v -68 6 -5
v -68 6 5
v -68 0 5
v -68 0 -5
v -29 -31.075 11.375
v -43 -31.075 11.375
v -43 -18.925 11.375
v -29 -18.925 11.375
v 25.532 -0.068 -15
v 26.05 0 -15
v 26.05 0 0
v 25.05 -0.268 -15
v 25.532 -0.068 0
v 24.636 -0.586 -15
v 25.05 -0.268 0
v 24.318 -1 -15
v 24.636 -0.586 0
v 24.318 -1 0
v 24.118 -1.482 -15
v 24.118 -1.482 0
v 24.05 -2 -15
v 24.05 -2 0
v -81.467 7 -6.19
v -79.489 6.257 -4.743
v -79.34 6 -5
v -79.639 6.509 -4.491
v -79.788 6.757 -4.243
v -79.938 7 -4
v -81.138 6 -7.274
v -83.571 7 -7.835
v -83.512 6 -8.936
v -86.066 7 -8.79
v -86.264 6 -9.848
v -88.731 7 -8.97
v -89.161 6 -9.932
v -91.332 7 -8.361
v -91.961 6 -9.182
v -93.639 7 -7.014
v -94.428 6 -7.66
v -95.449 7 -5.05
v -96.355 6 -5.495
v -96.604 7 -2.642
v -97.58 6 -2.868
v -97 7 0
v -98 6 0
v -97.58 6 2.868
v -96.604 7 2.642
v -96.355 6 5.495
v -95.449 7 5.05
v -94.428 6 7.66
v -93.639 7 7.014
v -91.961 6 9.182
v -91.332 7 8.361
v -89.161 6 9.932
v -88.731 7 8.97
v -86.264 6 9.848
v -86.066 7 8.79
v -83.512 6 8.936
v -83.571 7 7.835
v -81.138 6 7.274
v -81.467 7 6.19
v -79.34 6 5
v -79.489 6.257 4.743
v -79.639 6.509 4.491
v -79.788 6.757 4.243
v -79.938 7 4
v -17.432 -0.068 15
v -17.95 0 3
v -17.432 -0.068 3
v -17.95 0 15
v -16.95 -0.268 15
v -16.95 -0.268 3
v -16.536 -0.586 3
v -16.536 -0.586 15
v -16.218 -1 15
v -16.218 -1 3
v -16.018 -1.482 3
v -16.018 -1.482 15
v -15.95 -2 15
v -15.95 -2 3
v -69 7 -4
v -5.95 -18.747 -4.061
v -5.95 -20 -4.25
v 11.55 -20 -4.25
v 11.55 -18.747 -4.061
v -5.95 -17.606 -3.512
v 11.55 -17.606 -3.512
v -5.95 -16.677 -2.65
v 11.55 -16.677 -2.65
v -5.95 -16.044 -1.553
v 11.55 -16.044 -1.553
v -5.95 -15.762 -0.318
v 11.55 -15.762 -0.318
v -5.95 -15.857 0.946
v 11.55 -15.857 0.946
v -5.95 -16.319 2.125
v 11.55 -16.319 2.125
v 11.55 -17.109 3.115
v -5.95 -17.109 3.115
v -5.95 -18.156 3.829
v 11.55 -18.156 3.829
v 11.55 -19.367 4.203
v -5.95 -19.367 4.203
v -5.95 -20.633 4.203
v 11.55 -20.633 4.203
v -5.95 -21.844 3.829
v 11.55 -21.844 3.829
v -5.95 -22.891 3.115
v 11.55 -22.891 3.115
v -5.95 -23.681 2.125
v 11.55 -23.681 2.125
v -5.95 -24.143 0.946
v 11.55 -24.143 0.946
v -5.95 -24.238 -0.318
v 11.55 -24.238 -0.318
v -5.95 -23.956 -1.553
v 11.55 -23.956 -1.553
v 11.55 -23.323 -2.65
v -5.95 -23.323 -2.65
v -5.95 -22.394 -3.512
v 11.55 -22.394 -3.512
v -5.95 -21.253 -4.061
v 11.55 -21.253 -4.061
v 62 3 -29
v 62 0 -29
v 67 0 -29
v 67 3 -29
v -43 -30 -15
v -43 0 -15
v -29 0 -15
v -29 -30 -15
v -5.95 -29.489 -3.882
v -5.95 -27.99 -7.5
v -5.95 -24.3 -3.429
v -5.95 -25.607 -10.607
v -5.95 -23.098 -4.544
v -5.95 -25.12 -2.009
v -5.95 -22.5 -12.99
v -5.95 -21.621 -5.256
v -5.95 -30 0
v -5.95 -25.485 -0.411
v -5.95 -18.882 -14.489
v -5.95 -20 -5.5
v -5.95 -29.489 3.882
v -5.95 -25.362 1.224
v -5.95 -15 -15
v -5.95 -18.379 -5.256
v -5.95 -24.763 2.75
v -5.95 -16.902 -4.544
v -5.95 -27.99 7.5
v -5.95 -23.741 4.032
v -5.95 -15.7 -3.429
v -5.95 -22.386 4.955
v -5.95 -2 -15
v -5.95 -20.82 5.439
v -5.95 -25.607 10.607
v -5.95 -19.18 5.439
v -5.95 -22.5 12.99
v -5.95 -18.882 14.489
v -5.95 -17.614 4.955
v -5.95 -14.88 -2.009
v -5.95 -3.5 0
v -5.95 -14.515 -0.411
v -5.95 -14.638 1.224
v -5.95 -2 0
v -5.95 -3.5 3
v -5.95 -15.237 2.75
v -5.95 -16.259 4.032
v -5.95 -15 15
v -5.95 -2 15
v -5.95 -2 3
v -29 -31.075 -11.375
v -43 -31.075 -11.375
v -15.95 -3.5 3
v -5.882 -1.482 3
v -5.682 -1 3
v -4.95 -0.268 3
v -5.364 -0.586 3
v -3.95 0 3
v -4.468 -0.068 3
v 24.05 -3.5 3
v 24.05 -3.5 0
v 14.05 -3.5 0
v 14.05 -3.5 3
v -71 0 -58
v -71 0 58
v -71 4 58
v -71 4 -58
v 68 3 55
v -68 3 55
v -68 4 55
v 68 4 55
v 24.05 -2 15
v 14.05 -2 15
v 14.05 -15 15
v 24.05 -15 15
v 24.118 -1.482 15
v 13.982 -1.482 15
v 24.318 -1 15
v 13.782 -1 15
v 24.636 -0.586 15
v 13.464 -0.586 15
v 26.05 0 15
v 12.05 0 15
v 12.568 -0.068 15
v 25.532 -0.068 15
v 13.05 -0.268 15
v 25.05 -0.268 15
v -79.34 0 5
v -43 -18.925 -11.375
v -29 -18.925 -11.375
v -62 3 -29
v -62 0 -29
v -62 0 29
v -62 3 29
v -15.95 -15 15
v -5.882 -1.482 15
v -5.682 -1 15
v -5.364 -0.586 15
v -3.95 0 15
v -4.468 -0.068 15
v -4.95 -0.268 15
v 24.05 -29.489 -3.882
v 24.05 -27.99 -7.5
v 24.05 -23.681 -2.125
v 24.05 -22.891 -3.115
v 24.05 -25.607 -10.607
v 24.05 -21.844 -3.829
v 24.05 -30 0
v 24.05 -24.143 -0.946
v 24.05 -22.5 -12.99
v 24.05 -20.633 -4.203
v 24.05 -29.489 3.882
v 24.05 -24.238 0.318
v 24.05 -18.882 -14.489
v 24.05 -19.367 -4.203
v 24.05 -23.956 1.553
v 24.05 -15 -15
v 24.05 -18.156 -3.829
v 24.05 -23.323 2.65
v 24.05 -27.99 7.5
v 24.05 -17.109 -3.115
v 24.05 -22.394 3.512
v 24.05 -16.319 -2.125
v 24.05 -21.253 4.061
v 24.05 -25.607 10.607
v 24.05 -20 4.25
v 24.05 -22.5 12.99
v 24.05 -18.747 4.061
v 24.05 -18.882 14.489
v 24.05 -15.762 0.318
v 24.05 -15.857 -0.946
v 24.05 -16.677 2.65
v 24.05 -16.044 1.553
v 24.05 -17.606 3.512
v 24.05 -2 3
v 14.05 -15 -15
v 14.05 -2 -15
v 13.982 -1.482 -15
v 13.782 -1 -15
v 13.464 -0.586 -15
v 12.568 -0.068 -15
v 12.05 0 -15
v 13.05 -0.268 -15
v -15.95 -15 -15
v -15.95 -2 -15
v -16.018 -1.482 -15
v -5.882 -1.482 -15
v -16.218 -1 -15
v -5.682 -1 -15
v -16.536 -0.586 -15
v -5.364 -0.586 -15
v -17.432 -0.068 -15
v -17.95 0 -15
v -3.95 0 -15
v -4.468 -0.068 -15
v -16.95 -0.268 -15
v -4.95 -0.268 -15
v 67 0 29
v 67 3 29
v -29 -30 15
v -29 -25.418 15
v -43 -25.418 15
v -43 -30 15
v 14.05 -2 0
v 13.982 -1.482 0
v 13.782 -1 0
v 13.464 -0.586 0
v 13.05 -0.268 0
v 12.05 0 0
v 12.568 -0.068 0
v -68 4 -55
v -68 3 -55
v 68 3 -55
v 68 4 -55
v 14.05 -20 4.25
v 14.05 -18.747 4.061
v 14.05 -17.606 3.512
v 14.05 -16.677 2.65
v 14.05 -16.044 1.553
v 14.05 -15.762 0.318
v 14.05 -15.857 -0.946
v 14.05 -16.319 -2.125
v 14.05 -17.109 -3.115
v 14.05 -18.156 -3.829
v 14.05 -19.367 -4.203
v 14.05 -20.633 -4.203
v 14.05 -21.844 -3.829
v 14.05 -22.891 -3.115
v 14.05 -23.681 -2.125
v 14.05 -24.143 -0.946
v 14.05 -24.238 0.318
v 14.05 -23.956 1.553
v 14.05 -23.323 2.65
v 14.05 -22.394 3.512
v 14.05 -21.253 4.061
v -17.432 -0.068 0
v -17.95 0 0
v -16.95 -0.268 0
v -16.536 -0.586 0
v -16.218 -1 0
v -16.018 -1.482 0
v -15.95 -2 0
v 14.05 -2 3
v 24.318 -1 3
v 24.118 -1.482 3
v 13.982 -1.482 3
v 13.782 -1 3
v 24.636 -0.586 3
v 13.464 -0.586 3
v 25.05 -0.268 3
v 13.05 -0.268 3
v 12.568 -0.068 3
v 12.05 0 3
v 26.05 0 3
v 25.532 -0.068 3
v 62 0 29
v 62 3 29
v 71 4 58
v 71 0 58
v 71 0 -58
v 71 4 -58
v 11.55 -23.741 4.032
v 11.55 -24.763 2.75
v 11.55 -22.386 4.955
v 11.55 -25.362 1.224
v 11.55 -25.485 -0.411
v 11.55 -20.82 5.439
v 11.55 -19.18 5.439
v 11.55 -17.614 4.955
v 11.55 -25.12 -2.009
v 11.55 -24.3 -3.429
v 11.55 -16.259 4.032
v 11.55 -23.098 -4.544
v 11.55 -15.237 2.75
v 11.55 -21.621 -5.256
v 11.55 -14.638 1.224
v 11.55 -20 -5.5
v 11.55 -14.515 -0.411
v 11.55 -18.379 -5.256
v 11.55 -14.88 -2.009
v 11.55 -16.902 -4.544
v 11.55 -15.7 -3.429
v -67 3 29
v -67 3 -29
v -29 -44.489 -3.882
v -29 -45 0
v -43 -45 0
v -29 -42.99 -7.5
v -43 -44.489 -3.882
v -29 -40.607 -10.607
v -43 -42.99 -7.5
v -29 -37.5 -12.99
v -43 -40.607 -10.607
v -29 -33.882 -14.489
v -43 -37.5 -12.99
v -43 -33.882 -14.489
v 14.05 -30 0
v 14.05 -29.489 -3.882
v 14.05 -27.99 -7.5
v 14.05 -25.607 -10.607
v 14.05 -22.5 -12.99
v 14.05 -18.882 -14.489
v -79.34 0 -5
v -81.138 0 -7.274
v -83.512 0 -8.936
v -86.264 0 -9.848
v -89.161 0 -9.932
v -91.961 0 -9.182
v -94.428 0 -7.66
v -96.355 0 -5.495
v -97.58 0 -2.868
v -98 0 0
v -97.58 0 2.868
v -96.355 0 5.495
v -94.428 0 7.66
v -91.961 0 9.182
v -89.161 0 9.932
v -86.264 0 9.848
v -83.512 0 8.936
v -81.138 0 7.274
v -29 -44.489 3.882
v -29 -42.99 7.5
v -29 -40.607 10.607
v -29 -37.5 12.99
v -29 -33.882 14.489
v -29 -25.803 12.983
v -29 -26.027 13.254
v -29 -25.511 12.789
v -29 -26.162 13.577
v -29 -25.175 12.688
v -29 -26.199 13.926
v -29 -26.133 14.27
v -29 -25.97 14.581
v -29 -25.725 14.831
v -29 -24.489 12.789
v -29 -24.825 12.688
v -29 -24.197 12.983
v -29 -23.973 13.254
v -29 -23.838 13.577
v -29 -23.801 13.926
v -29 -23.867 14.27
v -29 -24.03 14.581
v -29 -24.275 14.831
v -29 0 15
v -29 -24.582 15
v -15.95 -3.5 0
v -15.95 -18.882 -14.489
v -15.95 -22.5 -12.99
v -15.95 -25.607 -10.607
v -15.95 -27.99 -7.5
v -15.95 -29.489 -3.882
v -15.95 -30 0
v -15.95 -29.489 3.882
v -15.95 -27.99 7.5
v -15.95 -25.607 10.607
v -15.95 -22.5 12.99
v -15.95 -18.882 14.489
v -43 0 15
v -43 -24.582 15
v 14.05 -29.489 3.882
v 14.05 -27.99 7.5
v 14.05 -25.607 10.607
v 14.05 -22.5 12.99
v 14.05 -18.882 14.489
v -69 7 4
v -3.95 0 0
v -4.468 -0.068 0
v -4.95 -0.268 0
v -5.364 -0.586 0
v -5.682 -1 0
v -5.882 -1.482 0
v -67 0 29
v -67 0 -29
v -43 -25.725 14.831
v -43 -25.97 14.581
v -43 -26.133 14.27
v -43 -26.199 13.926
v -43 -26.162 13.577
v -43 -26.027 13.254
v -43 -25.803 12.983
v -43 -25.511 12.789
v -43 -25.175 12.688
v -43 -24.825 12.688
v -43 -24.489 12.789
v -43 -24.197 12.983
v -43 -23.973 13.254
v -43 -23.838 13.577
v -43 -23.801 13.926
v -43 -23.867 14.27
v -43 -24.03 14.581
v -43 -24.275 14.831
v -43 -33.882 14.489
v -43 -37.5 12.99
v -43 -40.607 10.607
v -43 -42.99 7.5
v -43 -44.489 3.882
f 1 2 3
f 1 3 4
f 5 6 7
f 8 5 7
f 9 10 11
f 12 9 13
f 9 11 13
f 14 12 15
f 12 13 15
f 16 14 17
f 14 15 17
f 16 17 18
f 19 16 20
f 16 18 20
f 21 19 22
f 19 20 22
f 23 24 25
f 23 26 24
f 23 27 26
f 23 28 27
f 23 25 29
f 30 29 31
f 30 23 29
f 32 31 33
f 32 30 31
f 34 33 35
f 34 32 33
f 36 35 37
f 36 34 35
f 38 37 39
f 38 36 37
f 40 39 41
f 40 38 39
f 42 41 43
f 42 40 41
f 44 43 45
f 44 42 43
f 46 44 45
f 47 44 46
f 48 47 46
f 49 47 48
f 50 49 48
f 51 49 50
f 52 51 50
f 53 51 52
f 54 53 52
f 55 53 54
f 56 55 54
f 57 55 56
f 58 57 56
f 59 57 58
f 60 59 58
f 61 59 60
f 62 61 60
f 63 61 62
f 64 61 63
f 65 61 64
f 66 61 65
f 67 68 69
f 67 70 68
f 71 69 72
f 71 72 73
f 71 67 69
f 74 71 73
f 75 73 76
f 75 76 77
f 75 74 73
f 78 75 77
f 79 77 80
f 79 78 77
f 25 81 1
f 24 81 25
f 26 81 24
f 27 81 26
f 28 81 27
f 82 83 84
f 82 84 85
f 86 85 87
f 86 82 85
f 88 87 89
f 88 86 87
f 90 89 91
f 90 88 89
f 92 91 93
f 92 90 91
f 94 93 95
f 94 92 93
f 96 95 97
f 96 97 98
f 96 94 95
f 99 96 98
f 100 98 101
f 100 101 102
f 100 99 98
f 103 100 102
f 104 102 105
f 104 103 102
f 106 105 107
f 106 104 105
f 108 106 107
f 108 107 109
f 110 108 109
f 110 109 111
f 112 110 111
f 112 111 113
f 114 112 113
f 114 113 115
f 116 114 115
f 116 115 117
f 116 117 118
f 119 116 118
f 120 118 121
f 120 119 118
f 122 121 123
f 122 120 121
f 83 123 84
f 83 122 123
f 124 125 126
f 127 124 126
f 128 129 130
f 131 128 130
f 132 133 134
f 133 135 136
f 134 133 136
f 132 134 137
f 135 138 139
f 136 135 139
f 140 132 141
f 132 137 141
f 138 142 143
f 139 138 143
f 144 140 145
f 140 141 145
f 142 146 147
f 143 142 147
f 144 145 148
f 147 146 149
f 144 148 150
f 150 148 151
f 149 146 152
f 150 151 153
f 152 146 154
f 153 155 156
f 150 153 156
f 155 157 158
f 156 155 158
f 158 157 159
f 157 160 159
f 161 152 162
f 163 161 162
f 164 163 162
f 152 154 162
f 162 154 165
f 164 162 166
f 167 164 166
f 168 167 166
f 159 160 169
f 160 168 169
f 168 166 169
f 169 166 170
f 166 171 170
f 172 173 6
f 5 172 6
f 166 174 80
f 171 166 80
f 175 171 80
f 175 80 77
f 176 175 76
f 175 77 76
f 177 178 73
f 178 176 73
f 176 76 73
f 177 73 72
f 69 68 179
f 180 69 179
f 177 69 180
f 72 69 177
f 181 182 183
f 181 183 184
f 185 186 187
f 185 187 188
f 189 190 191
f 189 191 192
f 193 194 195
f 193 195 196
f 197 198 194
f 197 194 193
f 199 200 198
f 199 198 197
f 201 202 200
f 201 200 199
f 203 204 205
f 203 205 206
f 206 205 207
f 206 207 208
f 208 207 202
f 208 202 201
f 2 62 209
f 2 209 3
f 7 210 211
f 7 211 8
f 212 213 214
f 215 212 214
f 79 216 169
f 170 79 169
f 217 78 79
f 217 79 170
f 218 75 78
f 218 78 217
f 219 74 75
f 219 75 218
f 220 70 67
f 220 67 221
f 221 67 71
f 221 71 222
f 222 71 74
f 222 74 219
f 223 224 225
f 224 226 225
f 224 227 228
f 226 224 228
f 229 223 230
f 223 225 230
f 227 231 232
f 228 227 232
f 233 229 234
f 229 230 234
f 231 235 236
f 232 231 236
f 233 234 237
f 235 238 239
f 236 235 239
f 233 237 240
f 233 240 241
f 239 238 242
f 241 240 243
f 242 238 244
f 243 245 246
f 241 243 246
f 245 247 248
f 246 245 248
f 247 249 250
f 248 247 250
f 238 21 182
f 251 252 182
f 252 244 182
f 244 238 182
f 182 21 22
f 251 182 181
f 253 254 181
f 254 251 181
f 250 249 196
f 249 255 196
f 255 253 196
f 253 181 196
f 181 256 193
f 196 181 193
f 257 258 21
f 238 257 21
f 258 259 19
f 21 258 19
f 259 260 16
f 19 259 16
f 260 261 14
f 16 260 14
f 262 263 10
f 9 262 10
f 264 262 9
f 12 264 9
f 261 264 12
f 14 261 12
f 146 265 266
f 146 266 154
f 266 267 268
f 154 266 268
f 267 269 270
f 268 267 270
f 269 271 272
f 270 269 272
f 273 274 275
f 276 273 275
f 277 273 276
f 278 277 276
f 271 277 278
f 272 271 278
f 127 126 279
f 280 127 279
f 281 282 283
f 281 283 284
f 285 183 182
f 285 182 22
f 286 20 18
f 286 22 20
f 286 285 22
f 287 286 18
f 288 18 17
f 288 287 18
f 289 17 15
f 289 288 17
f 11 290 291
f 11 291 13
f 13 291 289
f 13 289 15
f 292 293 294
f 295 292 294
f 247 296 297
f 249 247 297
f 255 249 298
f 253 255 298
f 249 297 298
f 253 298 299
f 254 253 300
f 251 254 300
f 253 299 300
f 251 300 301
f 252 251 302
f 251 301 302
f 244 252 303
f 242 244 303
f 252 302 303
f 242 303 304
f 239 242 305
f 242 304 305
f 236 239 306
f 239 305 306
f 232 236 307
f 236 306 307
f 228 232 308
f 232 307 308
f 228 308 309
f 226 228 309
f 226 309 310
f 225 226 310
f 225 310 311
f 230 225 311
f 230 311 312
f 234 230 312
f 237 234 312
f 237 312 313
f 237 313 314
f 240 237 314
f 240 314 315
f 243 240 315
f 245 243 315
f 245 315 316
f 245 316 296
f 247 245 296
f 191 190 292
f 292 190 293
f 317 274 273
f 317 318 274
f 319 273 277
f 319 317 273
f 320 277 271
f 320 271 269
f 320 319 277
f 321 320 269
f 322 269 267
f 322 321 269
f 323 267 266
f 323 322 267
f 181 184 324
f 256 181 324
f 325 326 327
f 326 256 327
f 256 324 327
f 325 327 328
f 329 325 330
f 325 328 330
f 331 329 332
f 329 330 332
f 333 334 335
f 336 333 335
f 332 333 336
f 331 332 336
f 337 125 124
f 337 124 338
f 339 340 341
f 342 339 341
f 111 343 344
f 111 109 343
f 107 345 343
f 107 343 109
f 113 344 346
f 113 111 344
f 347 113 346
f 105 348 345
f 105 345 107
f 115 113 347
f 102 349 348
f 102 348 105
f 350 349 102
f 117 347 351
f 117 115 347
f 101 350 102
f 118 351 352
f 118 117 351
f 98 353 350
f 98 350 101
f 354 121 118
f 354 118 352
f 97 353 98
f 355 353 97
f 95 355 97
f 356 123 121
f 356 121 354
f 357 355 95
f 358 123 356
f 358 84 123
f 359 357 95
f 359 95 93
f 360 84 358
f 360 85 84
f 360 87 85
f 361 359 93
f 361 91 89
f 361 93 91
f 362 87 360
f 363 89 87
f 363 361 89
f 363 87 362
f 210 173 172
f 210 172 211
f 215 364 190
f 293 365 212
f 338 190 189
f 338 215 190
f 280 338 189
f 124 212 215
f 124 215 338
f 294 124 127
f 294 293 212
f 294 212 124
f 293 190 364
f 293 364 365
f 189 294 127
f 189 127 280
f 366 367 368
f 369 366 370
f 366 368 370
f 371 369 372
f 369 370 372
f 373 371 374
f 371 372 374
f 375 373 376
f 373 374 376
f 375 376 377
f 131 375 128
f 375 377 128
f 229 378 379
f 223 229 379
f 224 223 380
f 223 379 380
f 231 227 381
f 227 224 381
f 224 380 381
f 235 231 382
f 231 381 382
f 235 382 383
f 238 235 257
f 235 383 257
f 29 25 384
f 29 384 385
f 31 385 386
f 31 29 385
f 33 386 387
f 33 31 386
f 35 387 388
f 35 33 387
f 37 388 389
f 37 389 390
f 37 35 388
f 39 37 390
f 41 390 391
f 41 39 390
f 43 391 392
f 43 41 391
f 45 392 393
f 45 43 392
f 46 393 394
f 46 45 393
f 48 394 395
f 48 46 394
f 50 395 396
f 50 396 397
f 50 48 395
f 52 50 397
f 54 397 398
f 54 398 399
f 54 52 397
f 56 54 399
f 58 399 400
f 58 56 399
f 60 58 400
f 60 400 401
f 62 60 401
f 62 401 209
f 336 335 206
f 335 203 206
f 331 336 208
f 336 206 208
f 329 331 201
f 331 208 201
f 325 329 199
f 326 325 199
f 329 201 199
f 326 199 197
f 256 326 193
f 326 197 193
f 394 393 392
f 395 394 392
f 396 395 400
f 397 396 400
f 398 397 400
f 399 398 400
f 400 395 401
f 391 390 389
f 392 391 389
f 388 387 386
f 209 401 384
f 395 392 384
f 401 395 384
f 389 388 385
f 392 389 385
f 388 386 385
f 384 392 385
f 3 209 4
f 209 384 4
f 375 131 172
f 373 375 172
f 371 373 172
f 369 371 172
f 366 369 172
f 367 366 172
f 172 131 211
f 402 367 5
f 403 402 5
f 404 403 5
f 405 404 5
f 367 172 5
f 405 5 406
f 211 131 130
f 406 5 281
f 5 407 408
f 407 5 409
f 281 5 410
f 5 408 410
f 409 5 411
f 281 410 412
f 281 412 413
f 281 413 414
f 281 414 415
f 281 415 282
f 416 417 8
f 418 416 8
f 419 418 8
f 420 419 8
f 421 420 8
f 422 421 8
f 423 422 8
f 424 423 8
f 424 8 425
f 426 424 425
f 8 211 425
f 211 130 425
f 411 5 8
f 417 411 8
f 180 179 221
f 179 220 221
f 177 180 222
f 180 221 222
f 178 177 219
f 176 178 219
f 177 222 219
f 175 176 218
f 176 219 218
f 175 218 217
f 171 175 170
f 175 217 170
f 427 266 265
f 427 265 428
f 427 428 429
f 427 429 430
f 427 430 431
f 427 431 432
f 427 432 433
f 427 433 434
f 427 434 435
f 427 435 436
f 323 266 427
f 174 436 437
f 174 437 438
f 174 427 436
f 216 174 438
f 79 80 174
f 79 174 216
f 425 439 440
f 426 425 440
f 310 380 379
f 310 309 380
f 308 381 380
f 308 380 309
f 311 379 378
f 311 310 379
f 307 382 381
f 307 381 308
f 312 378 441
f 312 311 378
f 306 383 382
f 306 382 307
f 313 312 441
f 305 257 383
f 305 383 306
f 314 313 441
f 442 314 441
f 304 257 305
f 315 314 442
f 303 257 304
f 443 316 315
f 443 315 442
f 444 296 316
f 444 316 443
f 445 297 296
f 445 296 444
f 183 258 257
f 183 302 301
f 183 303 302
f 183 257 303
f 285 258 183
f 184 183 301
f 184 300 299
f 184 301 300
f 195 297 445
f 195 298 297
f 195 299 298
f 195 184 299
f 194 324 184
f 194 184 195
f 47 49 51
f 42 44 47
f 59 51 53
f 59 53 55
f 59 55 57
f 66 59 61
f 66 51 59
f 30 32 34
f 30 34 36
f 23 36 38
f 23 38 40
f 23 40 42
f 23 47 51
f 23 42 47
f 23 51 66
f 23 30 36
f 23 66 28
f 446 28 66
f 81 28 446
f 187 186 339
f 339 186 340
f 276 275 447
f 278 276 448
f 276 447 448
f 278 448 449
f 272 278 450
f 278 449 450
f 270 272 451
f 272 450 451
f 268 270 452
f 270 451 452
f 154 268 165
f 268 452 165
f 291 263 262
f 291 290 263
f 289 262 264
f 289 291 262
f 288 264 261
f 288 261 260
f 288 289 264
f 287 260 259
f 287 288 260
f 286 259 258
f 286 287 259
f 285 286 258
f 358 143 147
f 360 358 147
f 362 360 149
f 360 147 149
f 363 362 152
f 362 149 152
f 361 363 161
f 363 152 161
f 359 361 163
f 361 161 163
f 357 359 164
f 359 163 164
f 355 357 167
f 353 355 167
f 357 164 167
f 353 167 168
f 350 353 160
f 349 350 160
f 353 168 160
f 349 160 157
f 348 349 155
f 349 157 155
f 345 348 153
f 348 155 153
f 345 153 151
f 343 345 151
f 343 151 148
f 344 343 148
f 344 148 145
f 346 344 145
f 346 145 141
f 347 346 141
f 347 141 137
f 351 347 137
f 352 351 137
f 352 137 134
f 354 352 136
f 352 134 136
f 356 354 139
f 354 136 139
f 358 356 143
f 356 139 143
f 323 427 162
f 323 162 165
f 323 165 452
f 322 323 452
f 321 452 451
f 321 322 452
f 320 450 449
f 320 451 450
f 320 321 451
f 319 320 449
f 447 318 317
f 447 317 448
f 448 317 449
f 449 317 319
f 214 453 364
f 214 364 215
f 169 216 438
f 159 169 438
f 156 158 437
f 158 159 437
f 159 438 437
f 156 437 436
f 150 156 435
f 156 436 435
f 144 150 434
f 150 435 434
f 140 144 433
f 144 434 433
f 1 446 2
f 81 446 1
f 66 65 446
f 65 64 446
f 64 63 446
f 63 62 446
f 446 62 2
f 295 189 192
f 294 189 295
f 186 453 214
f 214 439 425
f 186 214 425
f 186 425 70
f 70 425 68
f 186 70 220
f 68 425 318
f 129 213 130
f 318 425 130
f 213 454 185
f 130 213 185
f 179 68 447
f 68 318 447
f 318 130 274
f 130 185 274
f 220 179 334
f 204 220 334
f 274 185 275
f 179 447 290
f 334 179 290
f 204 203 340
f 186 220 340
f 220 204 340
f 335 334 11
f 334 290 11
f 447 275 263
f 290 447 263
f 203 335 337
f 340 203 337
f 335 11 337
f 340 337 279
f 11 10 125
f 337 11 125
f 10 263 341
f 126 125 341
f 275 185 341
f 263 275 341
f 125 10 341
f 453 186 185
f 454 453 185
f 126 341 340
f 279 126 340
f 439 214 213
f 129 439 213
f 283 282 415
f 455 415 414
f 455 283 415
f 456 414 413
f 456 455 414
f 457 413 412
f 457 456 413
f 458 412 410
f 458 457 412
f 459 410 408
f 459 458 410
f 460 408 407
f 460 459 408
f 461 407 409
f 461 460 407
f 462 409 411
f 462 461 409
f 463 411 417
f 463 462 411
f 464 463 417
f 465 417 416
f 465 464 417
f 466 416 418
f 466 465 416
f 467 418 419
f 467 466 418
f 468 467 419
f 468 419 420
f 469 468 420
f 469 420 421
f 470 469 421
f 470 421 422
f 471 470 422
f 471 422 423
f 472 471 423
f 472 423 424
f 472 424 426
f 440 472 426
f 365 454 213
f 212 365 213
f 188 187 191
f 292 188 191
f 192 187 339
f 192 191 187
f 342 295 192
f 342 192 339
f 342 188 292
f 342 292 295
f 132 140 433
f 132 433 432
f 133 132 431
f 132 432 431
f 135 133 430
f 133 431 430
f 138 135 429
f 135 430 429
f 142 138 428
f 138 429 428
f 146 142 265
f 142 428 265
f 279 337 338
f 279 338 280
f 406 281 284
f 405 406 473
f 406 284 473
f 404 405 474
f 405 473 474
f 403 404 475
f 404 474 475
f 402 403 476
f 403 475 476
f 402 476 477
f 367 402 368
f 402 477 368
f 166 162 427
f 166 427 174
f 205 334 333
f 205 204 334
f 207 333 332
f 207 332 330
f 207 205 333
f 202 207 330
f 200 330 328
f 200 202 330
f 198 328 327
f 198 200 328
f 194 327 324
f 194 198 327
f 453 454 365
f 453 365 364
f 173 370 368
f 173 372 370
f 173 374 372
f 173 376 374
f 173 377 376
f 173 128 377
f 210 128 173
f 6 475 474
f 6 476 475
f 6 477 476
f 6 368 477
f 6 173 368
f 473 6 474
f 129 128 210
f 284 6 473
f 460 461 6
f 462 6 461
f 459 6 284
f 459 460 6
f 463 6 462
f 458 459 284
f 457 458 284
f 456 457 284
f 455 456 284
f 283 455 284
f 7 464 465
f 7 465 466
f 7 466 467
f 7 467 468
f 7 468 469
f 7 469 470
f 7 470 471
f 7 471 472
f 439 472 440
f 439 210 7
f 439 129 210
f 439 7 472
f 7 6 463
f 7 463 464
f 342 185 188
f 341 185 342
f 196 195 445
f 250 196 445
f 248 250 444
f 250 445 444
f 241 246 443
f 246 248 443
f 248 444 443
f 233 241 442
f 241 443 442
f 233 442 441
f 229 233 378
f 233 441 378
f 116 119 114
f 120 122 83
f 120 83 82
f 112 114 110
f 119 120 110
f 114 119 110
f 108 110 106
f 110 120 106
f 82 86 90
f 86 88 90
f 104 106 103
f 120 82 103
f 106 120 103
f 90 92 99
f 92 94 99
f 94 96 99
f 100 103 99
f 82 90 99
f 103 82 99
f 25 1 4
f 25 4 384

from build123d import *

# Parameters (mm, degrees)
SKETCH2_W                 = 142
SKETCH2_H                 = 116
BOSS_EXTRUDE2_DEPTH       = 4
SHELL1_T                  = -3
SKETCH4_W                 = 10
SKETCH4_H                 = 30
BOSS_EXTRUDE4_DEPTH       = 30
CUT_EXTRUDE1_DEPTH        = 31
CUT_EXTRUDE1_DEPTH_BACK   = 113
SKETCH6_W                 = 3
SKETCH6_H                 = 3.5
CUT_EXTRUDE2_DEPTH        = 31
CUT_EXTRUDE2_DEPTH_BACK   = 113
FILLET2_R                 = 2
SKETCH9_W                 = 22.5
SKETCH9_H                 = 12.1
CUT_EXTRUDE3_DEPTH        = 31
CUT_EXTRUDE3_DEPTH_BACK   = 10
SKETCH11_R                = 5.5
SKETCH11_R_2              = 4.25
BOSS_EXTRUDE6_DEPTH       = 17.5
M3X0_5_TAPPED_HOLE1_D     = 2.2
M3X0_5_TAPPED_HOLE1_DEPTH = 10
M3X0_5_TAPPED_HOLE1_TIP   = 0.660946681
SKETCH19_W                = 3
SKETCH19_H                = 10
BOSS_EXTRUDE7_DEPTH       = 3
BOSS_EXTRUDE7_DEPTH_BACK  = 4
CHAMFER1_SIZE             = 1
SKETCH27_W                = 14
SKETCH27_H                = 35
BOSS_EXTRUDE10_DEPTH      = 45
CUT_EXTRUDE4_DEPTH        = 45
SKETCH29_W                = 22.75
SKETCH29_H                = 12.15
CUT_EXTRUDE5_DEPTH        = 14
SKETCH37_R                = 4.25
CUT_EXTRUDE6_DEPTH        = 57.95
SKETCH38_W                = 5
SKETCH38_H                = 58
CUT_EXTRUDE7_DEPTH        = 8


with BuildPart() as part:
    # Sketch2 → Boss-Extrude2 (new body)
    with BuildSketch(Plane(origin=(0, 0, 0), x_dir=(1, 0, 0), z_dir=(0, 1, 0))):
        Rectangle(SKETCH2_W, SKETCH2_H)
    extrude(amount=BOSS_EXTRUDE2_DEPTH)

    # Shell1
    shell1_openings = [part.faces().sort_by_distance(p)[0] for p in [
        (0, 4, 0),
    ]]
    offset(amount=SHELL1_T, openings=shell1_openings, kind=Kind.INTERSECTION)

    # Sketch4 → Boss-Extrude4 (add)
    with BuildSketch(Plane.XZ):
        with Locations((-36, 0)):
            Rectangle(SKETCH4_W, SKETCH4_H)
        with Locations((19.05, 0)):
            Rectangle(SKETCH4_W, SKETCH4_H)
        with Locations((-10.95, 0)):
            Rectangle(SKETCH4_W, SKETCH4_H)
    extrude(amount=BOSS_EXTRUDE4_DEPTH)

    # Sketch5 → Cut-Extrude1 (cut, two sides)
    with BuildSketch(Plane.ZY.offset(41)) as cut_extrude1_sk:
        with BuildLine():
            ThreePointArc((-1.6e-08, -30), (-10.606601724, -25.606601712), (-15, -15))
            Line((-15, -15), (-15, -30))
            Line((-15, -30), (-1.6e-08, -30))
        make_face()
        with BuildLine():
            ThreePointArc((15, -15), (10.606601712, -25.606601724), (-1.6e-08, -30))
            Line((-1.6e-08, -30), (15, -30))
            Line((15, -30), (15, -15))
        make_face()
    extrude(amount=CUT_EXTRUDE1_DEPTH, mode=Mode.SUBTRACT)
    extrude(cut_extrude1_sk.sketch, amount=-CUT_EXTRUDE1_DEPTH_BACK, mode=Mode.SUBTRACT)

    # Sketch6 → Cut-Extrude2 (cut, two sides)
    with BuildSketch(Plane.ZY.offset(41)) as cut_extrude2_sk:
        with Locations((1.5, -1.75)):
            Rectangle(SKETCH6_W, SKETCH6_H)
    extrude(amount=CUT_EXTRUDE2_DEPTH, mode=Mode.SUBTRACT)
    extrude(cut_extrude2_sk.sketch, amount=-CUT_EXTRUDE2_DEPTH_BACK, mode=Mode.SUBTRACT)

    # Fillet2
    fillet2_edges = [part.edges().sort_by_distance(p)[0] for p in [
        (-31, 0, 9),
        (-41, 0, -7.5),
        (24.05, 0, 9),
        (14.05, 0, -7.5),
        (-5.95, 0, 9),
        (-15.95, 0, -7.5),
        (-31, 0, -7.5),
        (-41, 0, 9),
        (24.05, 0, -7.5),
        (14.05, 0, 9),
        (-5.95, 0, -7.5),
        (-15.95, 0, 9),
    ]]
    fillet(fillet2_edges, radius=FILLET2_R)

    # Sketch9 → Cut-Extrude3 (cut, two sides)
    with BuildSketch(Plane.ZY.offset(41)) as cut_extrude3_sk:
        with Locations((0, -15)):
            Rectangle(SKETCH9_W, SKETCH9_H)
    extrude(amount=CUT_EXTRUDE3_DEPTH, mode=Mode.SUBTRACT)
    extrude(cut_extrude3_sk.sketch, amount=-CUT_EXTRUDE3_DEPTH_BACK, mode=Mode.SUBTRACT)

    # Sketch11 → Boss-Extrude6 (add)
    with BuildSketch(Plane(origin=(-5.95, 0, 0), x_dir=(0, 0, -1), z_dir=(1, 0, 0))):
        with Locations((0, -20)):
            Circle(SKETCH11_R)
        with Locations((0, -20)):
            Circle(SKETCH11_R_2, mode=Mode.SUBTRACT)
    extrude(amount=BOSS_EXTRUDE6_DEPTH)

    # M3x0.5 Tapped Hole1
    with Locations(Plane.ZY.offset(41)):
        with Locations((13.85, -15)):
            Hole(M3X0_5_TAPPED_HOLE1_D / 2, depth=M3X0_5_TAPPED_HOLE1_DEPTH)
            with Locations((0, 0, -(M3X0_5_TAPPED_HOLE1_DEPTH + M3X0_5_TAPPED_HOLE1_TIP / 2))):  # 118° drill point
                Cone(0, M3X0_5_TAPPED_HOLE1_D / 2, M3X0_5_TAPPED_HOLE1_TIP, mode=Mode.SUBTRACT)

    # Sketch27 → Boss-Extrude10 (add)
    with BuildSketch(Plane.XZ):
        with Locations((-36, 2.5)):
            Rectangle(SKETCH27_W, SKETCH27_H)
    extrude(amount=BOSS_EXTRUDE10_DEPTH)

    # Sketch28 → Cut-Extrude4 (cut)
    with BuildSketch(Plane.ZY.offset(43)):
        with BuildLine():
            Line((15, 0), (15, -30))
            ThreePointArc((15, -30), (10.606601718, -40.606601718), (0, -45))
            Line((0, -45), (20, -45))
            Line((20, -45), (20, 0))
            Line((20, 0), (15, 0))
        make_face()
        with BuildLine():
            Line((-15, -45), (0, -45))
            ThreePointArc((0, -45), (-10.606601718, -40.606601718), (-15, -30))
            Line((-15, -30), (-15, -45))
        make_face()
    extrude(amount=-CUT_EXTRUDE4_DEPTH, mode=Mode.SUBTRACT)

    # Sketch29 → Cut-Extrude5 (cut)
    with BuildSketch(Plane.ZY.offset(43)):
        with Locations((0, -25)):
            Rectangle(SKETCH29_W, SKETCH29_H)
    extrude(amount=-CUT_EXTRUDE5_DEPTH, mode=Mode.SUBTRACT)

    # Sketch36 → M2 Clearance Hole1 (revolve, cut)
    with BuildSketch(Plane(origin=(-43, -25, 13.875), x_dir=(0, 0, 1), z_dir=(0, 1, 0))):
        Polygon((0, 0), (0, 14.721032743), (1.2, 14), (1.2, 0), align=None)
    revolve(axis=Axis((-49.35, -25, 13.875), (1, 0, 0)), mode=Mode.SUBTRACT)

    # Sketch37 → Cut-Extrude6 (cut, through all)
    with BuildSketch(Plane.ZY.offset(-14.05)):
        with Locations((0, -20)):
            Circle(SKETCH37_R)
    extrude(amount=-CUT_EXTRUDE6_DEPTH, mode=Mode.SUBTRACT)

    # Sketch38 → Cut-Extrude7 (cut, through all)
    with BuildSketch(Plane.XZ):
        with Locations((-64.5, 0)):
            Rectangle(SKETCH38_W, SKETCH38_H)
        with Locations((64.5, 0)):
            Rectangle(SKETCH38_W, SKETCH38_H)
    extrude(amount=-CUT_EXTRUDE7_DEPTH, mode=Mode.SUBTRACT)


with BuildPart() as body_2:
    # Sketch19 → Boss-Extrude7 (new body, two sides)
    with BuildSketch(Plane(origin=(0, 4, 0), x_dir=(1, 0, 0), z_dir=(0, 1, 0))) as boss_extrude7_sk:
        with BuildLine():
            ThreePointArc((-78, 0), (-78.340741737, 2.588190451), (-79.339745962, 5))
            Line((-79.339745962, 5), (-88, 5))
            Line((-88, 5), (-88, -5))
            Line((-88, -5), (-79.339745962, -5))
            ThreePointArc((-79.339745962, -5), (-78.340741737, -2.588190451), (-78, 0))
        make_face()
        with BuildLine():
            Line((-88, 5), (-79.339745962, 5))
            ThreePointArc((-79.339745962, 5), (-98, 0), (-79.339745962, -5))
            Line((-79.339745962, -5), (-88, -5))
            Line((-88, -5), (-88, 5))
        make_face()
        with BuildLine():
            Line((-71, -5), (-71, 5))
            Line((-71, 5), (-79.339745962, 5))
            ThreePointArc((-79.339745962, 5), (-78.340741737, 2.588190451), (-78, 0))
            ThreePointArc((-78, 0), (-78.340741737, -2.588190451), (-79.339745962, -5))
            Line((-79.339745962, -5), (-71, -5))
        make_face()
        with Locations((-69.5, 0)):
            Rectangle(SKETCH19_W, SKETCH19_H)
    extrude(amount=BOSS_EXTRUDE7_DEPTH)
    extrude(boss_extrude7_sk.sketch, amount=-BOSS_EXTRUDE7_DEPTH_BACK)

    # Chamfer1
    chamfer1_edges = [body_2.edges().sort_by_distance(p)[0] for p in [
        (-73.669872981, 7, 5),
        (-98, 7, 0),
        (-68, 7, 0),
        (-73.669872981, 7, -5),
    ]]
    chamfer(chamfer1_edges, length=CHAMFER1_SIZE)


solid = Compound([part.part, body_2.part])
